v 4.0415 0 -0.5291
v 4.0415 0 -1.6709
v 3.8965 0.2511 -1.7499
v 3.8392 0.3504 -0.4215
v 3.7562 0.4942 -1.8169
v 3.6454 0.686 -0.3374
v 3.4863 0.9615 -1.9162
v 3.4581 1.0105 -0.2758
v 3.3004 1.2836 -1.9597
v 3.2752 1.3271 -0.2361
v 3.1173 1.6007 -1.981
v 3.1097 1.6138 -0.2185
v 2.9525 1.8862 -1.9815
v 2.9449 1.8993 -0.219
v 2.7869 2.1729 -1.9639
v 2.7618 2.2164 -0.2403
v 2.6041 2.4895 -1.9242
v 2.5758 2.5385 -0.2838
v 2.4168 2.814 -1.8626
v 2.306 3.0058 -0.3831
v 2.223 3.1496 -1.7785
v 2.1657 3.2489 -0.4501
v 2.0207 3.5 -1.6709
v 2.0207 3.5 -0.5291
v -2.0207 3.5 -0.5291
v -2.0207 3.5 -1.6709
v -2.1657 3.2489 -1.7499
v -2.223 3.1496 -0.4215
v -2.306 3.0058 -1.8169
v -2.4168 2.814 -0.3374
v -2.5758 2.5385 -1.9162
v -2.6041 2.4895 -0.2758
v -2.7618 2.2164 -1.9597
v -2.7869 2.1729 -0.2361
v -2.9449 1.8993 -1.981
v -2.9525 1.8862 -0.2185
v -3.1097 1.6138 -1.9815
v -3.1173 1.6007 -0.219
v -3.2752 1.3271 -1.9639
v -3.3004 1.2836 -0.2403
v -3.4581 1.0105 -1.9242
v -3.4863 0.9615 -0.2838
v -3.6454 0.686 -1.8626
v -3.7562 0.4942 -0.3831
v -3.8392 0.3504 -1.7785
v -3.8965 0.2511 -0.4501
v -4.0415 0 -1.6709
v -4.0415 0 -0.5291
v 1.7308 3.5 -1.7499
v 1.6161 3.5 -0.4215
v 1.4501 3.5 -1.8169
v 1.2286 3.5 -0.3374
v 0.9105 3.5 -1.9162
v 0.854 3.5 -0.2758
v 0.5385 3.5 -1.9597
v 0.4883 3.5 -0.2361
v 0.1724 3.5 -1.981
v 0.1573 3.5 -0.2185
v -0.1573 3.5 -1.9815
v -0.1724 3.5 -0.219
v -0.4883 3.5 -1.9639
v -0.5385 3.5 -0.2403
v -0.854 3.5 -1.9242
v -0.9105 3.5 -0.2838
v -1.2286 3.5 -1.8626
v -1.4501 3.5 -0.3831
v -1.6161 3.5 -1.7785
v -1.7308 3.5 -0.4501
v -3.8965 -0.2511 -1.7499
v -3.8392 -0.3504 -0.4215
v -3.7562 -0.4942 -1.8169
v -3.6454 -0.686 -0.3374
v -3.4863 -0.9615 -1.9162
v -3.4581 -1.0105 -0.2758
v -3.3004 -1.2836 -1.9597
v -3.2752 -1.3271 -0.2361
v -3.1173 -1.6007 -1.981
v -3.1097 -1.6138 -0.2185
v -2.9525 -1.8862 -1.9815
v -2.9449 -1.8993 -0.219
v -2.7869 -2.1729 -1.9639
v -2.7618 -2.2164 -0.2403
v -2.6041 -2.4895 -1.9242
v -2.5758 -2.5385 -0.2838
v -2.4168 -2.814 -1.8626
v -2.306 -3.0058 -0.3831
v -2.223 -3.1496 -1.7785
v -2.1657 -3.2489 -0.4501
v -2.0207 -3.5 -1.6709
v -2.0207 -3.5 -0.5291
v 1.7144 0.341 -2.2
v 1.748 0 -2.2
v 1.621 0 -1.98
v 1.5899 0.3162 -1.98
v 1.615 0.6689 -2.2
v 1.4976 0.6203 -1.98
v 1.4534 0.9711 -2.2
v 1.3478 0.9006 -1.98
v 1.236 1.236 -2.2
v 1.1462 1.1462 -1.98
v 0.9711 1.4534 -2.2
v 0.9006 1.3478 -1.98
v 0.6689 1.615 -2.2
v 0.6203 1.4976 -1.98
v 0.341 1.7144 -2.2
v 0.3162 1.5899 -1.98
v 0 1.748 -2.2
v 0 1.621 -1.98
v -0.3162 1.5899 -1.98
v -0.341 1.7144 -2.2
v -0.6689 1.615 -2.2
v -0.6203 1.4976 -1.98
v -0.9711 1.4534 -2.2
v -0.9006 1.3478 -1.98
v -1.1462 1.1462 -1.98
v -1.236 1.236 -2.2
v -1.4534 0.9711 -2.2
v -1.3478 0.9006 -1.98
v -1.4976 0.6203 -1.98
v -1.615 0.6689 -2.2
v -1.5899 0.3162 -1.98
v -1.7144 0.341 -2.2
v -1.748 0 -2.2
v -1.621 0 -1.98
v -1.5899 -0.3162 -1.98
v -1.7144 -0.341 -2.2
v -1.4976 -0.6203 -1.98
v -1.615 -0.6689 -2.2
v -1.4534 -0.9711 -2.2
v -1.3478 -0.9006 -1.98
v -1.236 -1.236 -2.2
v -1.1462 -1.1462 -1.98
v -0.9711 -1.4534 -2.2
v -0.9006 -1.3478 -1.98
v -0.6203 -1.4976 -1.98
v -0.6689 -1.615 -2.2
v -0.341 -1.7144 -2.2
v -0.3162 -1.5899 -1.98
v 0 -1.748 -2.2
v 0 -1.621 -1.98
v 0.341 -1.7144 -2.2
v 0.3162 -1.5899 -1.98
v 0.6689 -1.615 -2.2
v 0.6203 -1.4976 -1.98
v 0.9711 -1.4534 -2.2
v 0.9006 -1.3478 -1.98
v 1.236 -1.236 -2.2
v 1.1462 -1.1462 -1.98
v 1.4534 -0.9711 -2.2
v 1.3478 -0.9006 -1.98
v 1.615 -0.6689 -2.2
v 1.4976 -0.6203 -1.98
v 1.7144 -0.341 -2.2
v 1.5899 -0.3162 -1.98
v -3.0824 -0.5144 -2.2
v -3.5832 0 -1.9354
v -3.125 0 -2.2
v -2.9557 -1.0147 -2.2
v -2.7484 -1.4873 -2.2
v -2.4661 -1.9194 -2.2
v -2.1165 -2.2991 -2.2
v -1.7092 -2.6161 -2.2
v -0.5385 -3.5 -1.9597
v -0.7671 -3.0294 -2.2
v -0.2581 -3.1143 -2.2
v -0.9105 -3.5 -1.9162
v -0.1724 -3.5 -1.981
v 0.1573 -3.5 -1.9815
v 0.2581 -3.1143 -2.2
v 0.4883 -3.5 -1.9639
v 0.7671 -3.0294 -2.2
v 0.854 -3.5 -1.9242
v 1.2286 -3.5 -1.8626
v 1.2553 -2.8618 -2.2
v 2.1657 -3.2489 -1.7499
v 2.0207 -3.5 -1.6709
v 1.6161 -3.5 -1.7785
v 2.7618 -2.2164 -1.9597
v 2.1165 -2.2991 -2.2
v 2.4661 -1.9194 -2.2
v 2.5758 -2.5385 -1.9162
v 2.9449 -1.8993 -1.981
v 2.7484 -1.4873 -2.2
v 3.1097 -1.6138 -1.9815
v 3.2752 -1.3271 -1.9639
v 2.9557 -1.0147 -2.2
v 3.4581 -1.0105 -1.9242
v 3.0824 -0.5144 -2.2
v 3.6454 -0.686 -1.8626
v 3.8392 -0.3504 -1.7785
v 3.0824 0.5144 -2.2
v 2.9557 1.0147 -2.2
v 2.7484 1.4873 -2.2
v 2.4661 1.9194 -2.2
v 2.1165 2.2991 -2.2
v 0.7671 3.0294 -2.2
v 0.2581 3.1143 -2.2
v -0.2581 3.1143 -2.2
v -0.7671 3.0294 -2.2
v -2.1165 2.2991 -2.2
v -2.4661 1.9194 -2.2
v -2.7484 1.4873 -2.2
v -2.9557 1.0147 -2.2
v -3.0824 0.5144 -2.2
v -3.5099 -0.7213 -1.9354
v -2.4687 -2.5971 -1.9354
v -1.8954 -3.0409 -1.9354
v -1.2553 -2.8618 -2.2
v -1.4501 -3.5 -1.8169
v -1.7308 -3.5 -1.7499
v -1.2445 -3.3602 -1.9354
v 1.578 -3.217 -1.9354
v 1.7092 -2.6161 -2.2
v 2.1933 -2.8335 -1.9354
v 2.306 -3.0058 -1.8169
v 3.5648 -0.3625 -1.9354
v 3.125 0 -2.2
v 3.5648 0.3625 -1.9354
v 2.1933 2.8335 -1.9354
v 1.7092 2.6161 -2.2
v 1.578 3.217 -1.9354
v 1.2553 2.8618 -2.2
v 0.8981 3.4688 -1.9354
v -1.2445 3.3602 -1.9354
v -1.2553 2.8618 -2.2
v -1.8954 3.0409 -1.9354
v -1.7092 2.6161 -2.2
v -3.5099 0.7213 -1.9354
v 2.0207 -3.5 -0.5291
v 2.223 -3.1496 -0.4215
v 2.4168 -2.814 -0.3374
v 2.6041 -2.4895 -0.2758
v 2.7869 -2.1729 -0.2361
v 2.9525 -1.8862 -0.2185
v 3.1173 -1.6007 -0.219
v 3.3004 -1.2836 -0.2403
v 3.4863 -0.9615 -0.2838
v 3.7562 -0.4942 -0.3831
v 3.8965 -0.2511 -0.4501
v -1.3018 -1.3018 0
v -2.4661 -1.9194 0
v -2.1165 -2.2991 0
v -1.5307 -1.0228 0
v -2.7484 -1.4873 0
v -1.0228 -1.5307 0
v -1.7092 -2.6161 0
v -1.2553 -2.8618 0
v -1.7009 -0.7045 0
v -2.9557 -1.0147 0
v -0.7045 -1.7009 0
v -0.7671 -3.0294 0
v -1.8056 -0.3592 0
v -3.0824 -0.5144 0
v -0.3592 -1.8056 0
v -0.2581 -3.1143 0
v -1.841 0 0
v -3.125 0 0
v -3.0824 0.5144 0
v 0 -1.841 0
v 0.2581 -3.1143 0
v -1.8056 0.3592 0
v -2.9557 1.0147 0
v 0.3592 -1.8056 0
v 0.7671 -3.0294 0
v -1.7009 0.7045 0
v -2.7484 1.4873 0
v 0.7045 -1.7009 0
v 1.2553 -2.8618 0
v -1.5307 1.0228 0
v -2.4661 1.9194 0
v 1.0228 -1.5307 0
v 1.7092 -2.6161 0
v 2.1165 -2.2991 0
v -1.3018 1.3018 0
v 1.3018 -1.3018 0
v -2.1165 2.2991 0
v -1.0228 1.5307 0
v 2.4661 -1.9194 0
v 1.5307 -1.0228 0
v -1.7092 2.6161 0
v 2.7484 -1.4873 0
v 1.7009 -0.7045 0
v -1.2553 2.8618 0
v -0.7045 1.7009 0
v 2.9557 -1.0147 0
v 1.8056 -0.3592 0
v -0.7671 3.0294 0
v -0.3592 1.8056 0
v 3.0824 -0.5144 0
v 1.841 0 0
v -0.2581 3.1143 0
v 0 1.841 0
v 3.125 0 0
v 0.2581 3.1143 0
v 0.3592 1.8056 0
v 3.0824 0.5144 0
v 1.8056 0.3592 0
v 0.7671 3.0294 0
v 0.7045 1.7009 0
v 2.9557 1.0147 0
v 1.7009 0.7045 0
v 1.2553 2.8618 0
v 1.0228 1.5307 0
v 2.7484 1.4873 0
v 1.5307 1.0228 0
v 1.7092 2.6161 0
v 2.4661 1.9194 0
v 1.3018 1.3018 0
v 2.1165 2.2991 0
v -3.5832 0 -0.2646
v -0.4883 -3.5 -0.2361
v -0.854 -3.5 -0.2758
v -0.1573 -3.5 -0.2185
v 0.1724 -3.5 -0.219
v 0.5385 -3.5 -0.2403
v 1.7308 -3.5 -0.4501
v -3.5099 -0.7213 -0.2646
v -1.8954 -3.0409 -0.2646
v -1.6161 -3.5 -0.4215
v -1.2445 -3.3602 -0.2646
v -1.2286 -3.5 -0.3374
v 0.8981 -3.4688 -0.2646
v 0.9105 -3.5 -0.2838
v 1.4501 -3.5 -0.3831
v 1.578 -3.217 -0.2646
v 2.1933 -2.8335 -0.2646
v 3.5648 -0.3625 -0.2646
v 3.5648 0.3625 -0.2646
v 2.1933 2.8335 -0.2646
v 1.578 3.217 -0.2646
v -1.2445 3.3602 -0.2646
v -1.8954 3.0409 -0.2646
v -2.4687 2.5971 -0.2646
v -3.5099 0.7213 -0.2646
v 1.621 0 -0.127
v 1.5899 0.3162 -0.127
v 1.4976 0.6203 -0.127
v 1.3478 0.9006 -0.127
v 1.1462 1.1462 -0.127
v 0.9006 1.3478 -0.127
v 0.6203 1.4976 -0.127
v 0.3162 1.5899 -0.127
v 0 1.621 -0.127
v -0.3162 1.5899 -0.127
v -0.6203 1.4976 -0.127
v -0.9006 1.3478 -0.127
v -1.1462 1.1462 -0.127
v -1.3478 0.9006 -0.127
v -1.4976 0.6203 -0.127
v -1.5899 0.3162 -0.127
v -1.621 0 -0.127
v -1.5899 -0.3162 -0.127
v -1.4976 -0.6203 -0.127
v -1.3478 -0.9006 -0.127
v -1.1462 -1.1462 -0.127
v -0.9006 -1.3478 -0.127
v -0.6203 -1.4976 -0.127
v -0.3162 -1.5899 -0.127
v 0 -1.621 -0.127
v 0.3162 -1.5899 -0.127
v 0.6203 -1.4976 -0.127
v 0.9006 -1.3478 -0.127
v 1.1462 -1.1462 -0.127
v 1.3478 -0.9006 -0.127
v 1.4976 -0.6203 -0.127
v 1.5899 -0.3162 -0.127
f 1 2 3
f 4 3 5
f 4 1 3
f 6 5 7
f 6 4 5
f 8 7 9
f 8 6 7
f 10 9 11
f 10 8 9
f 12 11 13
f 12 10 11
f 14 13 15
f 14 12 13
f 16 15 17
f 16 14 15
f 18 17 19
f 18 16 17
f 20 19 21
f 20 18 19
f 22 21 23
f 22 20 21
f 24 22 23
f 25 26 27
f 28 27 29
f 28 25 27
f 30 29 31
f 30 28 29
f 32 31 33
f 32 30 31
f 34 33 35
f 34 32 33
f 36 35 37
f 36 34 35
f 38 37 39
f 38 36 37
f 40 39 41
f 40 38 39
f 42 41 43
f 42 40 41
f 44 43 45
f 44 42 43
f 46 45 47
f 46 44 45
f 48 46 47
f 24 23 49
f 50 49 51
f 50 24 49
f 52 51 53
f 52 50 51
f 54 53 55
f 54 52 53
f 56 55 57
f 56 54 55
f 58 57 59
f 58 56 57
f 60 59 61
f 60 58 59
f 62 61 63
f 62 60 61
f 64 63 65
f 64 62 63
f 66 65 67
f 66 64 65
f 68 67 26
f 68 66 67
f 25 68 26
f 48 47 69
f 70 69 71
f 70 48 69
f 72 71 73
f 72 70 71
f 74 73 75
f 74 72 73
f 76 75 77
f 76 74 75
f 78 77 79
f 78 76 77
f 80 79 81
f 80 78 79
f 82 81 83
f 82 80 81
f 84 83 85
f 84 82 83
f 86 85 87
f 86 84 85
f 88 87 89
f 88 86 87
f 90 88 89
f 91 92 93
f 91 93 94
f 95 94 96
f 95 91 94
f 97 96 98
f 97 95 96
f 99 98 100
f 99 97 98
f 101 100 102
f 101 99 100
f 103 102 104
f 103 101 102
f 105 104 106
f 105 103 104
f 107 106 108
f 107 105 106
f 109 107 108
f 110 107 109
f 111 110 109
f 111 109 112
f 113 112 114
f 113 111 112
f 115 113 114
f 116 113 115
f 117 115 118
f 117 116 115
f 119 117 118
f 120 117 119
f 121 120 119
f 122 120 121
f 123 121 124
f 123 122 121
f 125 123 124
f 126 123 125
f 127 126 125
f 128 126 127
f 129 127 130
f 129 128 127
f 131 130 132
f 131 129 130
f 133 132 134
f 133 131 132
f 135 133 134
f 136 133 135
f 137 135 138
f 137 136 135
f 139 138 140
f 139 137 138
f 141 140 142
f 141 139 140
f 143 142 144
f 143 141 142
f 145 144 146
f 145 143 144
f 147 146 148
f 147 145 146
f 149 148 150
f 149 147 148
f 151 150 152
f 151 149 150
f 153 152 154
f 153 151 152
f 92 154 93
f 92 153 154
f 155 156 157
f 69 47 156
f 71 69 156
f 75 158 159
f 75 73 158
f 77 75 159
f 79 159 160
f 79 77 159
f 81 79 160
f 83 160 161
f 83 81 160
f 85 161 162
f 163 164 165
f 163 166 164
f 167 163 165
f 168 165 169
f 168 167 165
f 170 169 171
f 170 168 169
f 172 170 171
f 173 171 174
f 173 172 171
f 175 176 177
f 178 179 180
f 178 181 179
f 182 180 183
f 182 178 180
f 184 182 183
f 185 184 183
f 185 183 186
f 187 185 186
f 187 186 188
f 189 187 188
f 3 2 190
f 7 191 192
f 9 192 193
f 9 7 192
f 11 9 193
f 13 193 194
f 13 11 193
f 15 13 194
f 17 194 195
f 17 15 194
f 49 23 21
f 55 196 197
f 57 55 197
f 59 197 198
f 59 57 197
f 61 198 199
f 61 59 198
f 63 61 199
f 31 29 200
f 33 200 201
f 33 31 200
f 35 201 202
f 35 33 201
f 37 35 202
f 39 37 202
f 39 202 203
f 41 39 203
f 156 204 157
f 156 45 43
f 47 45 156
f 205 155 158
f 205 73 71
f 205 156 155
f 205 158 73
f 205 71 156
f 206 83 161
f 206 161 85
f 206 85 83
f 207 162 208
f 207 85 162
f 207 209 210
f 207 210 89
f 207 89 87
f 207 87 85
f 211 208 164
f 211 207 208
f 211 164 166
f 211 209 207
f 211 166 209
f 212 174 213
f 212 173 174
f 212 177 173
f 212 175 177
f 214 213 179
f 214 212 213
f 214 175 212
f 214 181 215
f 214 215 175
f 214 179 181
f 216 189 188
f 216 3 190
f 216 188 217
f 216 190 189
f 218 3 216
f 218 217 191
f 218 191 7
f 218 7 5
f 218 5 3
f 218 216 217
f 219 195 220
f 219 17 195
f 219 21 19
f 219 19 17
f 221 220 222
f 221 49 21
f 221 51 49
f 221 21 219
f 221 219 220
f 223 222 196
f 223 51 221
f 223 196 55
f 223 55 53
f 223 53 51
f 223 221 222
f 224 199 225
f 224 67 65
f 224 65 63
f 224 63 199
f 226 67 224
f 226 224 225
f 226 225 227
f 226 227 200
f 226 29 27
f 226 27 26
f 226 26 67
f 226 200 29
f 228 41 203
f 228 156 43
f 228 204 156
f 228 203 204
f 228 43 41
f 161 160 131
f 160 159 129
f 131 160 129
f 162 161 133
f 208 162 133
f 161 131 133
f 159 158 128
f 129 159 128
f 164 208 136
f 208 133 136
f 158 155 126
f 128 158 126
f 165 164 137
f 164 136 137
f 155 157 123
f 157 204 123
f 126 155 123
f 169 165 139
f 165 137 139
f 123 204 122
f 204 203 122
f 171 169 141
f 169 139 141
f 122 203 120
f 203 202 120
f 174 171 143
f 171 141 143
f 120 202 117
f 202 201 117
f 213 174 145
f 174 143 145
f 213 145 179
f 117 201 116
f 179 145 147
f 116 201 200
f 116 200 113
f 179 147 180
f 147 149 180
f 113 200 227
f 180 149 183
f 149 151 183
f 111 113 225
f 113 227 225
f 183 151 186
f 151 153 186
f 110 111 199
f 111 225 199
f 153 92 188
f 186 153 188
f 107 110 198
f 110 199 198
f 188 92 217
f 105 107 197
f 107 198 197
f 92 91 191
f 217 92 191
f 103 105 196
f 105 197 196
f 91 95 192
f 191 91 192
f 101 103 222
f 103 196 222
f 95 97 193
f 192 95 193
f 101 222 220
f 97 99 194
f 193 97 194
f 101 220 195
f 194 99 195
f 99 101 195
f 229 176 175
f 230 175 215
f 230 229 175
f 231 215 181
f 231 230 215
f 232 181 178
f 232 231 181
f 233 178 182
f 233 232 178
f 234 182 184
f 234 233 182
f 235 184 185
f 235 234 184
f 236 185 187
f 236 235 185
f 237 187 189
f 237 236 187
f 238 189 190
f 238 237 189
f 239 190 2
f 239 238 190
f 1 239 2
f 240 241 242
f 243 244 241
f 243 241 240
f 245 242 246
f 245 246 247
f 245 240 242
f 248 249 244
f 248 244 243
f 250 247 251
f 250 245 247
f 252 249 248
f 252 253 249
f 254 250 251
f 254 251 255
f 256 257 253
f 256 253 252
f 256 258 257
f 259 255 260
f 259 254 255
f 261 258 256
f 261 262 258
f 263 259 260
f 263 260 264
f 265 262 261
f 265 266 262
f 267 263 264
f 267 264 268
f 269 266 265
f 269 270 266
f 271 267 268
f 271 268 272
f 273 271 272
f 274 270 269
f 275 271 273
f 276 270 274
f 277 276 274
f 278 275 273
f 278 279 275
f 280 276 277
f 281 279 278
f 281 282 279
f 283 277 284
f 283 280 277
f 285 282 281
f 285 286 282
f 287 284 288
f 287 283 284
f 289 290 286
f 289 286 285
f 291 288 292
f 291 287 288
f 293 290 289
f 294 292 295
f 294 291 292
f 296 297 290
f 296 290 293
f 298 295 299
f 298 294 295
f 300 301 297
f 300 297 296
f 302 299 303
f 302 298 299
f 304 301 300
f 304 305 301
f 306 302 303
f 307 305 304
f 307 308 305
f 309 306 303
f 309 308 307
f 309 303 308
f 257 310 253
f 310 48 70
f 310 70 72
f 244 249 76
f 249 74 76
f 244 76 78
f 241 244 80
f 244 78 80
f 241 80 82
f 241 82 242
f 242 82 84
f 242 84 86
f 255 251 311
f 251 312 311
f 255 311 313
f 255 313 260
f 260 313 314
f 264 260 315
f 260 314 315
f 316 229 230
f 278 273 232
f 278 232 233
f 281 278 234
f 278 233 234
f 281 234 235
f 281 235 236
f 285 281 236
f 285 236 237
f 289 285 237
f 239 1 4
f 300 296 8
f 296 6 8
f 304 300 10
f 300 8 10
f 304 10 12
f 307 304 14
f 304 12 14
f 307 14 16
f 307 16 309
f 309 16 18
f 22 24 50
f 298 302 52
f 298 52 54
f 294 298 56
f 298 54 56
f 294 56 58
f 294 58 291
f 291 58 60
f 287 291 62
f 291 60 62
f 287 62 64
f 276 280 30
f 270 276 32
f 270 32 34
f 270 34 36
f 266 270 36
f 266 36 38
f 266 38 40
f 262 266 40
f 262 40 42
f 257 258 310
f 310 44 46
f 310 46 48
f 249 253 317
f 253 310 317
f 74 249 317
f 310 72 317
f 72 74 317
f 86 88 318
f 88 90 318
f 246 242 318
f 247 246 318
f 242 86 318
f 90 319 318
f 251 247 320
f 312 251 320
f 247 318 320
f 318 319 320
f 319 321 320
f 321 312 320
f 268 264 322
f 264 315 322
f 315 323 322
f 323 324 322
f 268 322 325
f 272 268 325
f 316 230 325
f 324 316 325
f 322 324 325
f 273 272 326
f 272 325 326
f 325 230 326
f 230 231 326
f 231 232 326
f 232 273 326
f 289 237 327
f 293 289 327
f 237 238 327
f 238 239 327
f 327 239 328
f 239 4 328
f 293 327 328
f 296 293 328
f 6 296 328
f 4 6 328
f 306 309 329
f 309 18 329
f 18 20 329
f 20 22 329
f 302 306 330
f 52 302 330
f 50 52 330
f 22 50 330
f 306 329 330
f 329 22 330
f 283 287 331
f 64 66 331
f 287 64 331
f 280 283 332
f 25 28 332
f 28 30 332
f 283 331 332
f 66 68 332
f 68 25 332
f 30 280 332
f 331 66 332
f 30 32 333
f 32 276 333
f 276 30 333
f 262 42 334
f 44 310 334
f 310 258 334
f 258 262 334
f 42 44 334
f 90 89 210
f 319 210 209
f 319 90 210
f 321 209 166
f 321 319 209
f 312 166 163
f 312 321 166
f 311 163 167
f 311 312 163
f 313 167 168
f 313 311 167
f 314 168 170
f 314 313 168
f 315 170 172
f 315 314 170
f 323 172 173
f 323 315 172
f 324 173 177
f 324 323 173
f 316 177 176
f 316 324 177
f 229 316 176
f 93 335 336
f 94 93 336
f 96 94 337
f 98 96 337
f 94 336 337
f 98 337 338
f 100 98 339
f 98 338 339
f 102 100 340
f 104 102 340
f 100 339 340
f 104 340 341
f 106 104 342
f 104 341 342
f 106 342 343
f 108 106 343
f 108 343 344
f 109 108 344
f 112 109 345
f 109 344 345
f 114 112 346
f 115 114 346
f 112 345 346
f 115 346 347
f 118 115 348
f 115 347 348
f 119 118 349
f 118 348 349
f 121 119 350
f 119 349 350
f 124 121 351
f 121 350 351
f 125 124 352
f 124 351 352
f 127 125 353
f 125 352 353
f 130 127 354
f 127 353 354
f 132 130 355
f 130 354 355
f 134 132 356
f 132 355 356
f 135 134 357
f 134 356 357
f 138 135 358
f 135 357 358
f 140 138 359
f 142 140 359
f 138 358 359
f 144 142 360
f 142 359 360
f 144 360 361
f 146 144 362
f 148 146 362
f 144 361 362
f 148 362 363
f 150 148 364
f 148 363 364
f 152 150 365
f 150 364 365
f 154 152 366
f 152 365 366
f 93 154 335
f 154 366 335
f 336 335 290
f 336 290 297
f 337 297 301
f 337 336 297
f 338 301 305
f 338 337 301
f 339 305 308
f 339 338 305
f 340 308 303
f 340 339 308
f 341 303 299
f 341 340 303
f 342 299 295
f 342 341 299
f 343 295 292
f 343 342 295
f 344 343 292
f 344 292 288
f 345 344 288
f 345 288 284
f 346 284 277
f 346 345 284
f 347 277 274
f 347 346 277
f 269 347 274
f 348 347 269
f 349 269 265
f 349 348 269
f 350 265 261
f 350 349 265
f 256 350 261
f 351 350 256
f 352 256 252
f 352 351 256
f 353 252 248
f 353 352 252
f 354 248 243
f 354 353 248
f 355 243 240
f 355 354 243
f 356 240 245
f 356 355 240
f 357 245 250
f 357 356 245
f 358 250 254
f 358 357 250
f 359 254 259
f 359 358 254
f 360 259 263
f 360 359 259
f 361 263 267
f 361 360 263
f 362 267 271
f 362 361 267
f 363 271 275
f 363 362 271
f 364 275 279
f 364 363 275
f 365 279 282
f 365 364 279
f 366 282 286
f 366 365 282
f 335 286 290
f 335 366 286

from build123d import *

# Parameters (mm, degrees)
SKETCH1_R               = 1.621
BASENUT_DEPTH           = 2.2
ENDCHAMFER_SIZE         = 0.22
ENDCHAMFER_SIZE2        = 0.127017059
ENDCHAMFER_PART_2_SIZE  = 0.22
ENDCHAMFER_PART_2_SIZE2 = 0.127017059


with BuildPart() as part:
    # Sketch1 → BaseNut (new body)
    with BuildSketch(Plane.XY):
        Polygon((2.020725942, -3.5), (4.041451884, 0), (2.020725942, 3.5), (-2.020725942, 3.5), (-4.041451884, 0), (-2.020725942, -3.5), align=None)
        Circle(SKETCH1_R, mode=Mode.SUBTRACT)
    extrude(amount=-BASENUT_DEPTH)

    # Sketch2 → Double-Chamfer (revolve, cut)
    with BuildSketch(Plane(origin=(0, 0, 0), x_dir=(1, 0, 0), z_dir=(0, 1, 0))):
        Polygon((-4.041451884, 2.2), (-3.125, 2.2), (-4.041451884, 1.670886258), align=None)
        Polygon((-4.041451884, 0.529113742), (-4.041451884, 0), (-3.125, 0), align=None)
    revolve(axis=Axis((0, 0, -3.375940562), (0, 0, 1)), mode=Mode.SUBTRACT)

    # EndChamfer
    endchamfer_edges = [part.edges().sort_by_distance(p)[0] for p in [
        (-1.621, 0, -2.2),
    ]]
    endchamfer_side = [part.faces().sort_by_distance(p)[0] for p in [
        (-1.621, 0, -1.1),
    ]]
    chamfer(endchamfer_edges, length=ENDCHAMFER_SIZE, length2=ENDCHAMFER_SIZE2, reference=endchamfer_side[0])

    # EndChamfer part 2
    endchamfer_part_2_edges = [part.edges().sort_by_distance(p)[0] for p in [
        (-1.621, 0, 0),
    ]]
    endchamfer_part_2_side = [part.faces().sort_by_distance(p)[0] for p in [
        (3.036611652, 0, 0),
    ]]
    chamfer(endchamfer_part_2_edges, length=ENDCHAMFER_PART_2_SIZE, length2=ENDCHAMFER_PART_2_SIZE2, reference=endchamfer_part_2_side[0])


solid = part.part
